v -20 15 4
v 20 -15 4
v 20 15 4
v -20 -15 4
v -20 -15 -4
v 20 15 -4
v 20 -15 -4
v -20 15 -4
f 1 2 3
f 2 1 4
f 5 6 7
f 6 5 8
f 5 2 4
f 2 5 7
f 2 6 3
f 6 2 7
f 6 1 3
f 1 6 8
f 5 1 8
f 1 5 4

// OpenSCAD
// 40 mm long, 30 mm wide, 8 mm high rectangular solid box
// Centered at origin (0,0,0)

// Main box body
cube([40, 30, 8], center = true);
